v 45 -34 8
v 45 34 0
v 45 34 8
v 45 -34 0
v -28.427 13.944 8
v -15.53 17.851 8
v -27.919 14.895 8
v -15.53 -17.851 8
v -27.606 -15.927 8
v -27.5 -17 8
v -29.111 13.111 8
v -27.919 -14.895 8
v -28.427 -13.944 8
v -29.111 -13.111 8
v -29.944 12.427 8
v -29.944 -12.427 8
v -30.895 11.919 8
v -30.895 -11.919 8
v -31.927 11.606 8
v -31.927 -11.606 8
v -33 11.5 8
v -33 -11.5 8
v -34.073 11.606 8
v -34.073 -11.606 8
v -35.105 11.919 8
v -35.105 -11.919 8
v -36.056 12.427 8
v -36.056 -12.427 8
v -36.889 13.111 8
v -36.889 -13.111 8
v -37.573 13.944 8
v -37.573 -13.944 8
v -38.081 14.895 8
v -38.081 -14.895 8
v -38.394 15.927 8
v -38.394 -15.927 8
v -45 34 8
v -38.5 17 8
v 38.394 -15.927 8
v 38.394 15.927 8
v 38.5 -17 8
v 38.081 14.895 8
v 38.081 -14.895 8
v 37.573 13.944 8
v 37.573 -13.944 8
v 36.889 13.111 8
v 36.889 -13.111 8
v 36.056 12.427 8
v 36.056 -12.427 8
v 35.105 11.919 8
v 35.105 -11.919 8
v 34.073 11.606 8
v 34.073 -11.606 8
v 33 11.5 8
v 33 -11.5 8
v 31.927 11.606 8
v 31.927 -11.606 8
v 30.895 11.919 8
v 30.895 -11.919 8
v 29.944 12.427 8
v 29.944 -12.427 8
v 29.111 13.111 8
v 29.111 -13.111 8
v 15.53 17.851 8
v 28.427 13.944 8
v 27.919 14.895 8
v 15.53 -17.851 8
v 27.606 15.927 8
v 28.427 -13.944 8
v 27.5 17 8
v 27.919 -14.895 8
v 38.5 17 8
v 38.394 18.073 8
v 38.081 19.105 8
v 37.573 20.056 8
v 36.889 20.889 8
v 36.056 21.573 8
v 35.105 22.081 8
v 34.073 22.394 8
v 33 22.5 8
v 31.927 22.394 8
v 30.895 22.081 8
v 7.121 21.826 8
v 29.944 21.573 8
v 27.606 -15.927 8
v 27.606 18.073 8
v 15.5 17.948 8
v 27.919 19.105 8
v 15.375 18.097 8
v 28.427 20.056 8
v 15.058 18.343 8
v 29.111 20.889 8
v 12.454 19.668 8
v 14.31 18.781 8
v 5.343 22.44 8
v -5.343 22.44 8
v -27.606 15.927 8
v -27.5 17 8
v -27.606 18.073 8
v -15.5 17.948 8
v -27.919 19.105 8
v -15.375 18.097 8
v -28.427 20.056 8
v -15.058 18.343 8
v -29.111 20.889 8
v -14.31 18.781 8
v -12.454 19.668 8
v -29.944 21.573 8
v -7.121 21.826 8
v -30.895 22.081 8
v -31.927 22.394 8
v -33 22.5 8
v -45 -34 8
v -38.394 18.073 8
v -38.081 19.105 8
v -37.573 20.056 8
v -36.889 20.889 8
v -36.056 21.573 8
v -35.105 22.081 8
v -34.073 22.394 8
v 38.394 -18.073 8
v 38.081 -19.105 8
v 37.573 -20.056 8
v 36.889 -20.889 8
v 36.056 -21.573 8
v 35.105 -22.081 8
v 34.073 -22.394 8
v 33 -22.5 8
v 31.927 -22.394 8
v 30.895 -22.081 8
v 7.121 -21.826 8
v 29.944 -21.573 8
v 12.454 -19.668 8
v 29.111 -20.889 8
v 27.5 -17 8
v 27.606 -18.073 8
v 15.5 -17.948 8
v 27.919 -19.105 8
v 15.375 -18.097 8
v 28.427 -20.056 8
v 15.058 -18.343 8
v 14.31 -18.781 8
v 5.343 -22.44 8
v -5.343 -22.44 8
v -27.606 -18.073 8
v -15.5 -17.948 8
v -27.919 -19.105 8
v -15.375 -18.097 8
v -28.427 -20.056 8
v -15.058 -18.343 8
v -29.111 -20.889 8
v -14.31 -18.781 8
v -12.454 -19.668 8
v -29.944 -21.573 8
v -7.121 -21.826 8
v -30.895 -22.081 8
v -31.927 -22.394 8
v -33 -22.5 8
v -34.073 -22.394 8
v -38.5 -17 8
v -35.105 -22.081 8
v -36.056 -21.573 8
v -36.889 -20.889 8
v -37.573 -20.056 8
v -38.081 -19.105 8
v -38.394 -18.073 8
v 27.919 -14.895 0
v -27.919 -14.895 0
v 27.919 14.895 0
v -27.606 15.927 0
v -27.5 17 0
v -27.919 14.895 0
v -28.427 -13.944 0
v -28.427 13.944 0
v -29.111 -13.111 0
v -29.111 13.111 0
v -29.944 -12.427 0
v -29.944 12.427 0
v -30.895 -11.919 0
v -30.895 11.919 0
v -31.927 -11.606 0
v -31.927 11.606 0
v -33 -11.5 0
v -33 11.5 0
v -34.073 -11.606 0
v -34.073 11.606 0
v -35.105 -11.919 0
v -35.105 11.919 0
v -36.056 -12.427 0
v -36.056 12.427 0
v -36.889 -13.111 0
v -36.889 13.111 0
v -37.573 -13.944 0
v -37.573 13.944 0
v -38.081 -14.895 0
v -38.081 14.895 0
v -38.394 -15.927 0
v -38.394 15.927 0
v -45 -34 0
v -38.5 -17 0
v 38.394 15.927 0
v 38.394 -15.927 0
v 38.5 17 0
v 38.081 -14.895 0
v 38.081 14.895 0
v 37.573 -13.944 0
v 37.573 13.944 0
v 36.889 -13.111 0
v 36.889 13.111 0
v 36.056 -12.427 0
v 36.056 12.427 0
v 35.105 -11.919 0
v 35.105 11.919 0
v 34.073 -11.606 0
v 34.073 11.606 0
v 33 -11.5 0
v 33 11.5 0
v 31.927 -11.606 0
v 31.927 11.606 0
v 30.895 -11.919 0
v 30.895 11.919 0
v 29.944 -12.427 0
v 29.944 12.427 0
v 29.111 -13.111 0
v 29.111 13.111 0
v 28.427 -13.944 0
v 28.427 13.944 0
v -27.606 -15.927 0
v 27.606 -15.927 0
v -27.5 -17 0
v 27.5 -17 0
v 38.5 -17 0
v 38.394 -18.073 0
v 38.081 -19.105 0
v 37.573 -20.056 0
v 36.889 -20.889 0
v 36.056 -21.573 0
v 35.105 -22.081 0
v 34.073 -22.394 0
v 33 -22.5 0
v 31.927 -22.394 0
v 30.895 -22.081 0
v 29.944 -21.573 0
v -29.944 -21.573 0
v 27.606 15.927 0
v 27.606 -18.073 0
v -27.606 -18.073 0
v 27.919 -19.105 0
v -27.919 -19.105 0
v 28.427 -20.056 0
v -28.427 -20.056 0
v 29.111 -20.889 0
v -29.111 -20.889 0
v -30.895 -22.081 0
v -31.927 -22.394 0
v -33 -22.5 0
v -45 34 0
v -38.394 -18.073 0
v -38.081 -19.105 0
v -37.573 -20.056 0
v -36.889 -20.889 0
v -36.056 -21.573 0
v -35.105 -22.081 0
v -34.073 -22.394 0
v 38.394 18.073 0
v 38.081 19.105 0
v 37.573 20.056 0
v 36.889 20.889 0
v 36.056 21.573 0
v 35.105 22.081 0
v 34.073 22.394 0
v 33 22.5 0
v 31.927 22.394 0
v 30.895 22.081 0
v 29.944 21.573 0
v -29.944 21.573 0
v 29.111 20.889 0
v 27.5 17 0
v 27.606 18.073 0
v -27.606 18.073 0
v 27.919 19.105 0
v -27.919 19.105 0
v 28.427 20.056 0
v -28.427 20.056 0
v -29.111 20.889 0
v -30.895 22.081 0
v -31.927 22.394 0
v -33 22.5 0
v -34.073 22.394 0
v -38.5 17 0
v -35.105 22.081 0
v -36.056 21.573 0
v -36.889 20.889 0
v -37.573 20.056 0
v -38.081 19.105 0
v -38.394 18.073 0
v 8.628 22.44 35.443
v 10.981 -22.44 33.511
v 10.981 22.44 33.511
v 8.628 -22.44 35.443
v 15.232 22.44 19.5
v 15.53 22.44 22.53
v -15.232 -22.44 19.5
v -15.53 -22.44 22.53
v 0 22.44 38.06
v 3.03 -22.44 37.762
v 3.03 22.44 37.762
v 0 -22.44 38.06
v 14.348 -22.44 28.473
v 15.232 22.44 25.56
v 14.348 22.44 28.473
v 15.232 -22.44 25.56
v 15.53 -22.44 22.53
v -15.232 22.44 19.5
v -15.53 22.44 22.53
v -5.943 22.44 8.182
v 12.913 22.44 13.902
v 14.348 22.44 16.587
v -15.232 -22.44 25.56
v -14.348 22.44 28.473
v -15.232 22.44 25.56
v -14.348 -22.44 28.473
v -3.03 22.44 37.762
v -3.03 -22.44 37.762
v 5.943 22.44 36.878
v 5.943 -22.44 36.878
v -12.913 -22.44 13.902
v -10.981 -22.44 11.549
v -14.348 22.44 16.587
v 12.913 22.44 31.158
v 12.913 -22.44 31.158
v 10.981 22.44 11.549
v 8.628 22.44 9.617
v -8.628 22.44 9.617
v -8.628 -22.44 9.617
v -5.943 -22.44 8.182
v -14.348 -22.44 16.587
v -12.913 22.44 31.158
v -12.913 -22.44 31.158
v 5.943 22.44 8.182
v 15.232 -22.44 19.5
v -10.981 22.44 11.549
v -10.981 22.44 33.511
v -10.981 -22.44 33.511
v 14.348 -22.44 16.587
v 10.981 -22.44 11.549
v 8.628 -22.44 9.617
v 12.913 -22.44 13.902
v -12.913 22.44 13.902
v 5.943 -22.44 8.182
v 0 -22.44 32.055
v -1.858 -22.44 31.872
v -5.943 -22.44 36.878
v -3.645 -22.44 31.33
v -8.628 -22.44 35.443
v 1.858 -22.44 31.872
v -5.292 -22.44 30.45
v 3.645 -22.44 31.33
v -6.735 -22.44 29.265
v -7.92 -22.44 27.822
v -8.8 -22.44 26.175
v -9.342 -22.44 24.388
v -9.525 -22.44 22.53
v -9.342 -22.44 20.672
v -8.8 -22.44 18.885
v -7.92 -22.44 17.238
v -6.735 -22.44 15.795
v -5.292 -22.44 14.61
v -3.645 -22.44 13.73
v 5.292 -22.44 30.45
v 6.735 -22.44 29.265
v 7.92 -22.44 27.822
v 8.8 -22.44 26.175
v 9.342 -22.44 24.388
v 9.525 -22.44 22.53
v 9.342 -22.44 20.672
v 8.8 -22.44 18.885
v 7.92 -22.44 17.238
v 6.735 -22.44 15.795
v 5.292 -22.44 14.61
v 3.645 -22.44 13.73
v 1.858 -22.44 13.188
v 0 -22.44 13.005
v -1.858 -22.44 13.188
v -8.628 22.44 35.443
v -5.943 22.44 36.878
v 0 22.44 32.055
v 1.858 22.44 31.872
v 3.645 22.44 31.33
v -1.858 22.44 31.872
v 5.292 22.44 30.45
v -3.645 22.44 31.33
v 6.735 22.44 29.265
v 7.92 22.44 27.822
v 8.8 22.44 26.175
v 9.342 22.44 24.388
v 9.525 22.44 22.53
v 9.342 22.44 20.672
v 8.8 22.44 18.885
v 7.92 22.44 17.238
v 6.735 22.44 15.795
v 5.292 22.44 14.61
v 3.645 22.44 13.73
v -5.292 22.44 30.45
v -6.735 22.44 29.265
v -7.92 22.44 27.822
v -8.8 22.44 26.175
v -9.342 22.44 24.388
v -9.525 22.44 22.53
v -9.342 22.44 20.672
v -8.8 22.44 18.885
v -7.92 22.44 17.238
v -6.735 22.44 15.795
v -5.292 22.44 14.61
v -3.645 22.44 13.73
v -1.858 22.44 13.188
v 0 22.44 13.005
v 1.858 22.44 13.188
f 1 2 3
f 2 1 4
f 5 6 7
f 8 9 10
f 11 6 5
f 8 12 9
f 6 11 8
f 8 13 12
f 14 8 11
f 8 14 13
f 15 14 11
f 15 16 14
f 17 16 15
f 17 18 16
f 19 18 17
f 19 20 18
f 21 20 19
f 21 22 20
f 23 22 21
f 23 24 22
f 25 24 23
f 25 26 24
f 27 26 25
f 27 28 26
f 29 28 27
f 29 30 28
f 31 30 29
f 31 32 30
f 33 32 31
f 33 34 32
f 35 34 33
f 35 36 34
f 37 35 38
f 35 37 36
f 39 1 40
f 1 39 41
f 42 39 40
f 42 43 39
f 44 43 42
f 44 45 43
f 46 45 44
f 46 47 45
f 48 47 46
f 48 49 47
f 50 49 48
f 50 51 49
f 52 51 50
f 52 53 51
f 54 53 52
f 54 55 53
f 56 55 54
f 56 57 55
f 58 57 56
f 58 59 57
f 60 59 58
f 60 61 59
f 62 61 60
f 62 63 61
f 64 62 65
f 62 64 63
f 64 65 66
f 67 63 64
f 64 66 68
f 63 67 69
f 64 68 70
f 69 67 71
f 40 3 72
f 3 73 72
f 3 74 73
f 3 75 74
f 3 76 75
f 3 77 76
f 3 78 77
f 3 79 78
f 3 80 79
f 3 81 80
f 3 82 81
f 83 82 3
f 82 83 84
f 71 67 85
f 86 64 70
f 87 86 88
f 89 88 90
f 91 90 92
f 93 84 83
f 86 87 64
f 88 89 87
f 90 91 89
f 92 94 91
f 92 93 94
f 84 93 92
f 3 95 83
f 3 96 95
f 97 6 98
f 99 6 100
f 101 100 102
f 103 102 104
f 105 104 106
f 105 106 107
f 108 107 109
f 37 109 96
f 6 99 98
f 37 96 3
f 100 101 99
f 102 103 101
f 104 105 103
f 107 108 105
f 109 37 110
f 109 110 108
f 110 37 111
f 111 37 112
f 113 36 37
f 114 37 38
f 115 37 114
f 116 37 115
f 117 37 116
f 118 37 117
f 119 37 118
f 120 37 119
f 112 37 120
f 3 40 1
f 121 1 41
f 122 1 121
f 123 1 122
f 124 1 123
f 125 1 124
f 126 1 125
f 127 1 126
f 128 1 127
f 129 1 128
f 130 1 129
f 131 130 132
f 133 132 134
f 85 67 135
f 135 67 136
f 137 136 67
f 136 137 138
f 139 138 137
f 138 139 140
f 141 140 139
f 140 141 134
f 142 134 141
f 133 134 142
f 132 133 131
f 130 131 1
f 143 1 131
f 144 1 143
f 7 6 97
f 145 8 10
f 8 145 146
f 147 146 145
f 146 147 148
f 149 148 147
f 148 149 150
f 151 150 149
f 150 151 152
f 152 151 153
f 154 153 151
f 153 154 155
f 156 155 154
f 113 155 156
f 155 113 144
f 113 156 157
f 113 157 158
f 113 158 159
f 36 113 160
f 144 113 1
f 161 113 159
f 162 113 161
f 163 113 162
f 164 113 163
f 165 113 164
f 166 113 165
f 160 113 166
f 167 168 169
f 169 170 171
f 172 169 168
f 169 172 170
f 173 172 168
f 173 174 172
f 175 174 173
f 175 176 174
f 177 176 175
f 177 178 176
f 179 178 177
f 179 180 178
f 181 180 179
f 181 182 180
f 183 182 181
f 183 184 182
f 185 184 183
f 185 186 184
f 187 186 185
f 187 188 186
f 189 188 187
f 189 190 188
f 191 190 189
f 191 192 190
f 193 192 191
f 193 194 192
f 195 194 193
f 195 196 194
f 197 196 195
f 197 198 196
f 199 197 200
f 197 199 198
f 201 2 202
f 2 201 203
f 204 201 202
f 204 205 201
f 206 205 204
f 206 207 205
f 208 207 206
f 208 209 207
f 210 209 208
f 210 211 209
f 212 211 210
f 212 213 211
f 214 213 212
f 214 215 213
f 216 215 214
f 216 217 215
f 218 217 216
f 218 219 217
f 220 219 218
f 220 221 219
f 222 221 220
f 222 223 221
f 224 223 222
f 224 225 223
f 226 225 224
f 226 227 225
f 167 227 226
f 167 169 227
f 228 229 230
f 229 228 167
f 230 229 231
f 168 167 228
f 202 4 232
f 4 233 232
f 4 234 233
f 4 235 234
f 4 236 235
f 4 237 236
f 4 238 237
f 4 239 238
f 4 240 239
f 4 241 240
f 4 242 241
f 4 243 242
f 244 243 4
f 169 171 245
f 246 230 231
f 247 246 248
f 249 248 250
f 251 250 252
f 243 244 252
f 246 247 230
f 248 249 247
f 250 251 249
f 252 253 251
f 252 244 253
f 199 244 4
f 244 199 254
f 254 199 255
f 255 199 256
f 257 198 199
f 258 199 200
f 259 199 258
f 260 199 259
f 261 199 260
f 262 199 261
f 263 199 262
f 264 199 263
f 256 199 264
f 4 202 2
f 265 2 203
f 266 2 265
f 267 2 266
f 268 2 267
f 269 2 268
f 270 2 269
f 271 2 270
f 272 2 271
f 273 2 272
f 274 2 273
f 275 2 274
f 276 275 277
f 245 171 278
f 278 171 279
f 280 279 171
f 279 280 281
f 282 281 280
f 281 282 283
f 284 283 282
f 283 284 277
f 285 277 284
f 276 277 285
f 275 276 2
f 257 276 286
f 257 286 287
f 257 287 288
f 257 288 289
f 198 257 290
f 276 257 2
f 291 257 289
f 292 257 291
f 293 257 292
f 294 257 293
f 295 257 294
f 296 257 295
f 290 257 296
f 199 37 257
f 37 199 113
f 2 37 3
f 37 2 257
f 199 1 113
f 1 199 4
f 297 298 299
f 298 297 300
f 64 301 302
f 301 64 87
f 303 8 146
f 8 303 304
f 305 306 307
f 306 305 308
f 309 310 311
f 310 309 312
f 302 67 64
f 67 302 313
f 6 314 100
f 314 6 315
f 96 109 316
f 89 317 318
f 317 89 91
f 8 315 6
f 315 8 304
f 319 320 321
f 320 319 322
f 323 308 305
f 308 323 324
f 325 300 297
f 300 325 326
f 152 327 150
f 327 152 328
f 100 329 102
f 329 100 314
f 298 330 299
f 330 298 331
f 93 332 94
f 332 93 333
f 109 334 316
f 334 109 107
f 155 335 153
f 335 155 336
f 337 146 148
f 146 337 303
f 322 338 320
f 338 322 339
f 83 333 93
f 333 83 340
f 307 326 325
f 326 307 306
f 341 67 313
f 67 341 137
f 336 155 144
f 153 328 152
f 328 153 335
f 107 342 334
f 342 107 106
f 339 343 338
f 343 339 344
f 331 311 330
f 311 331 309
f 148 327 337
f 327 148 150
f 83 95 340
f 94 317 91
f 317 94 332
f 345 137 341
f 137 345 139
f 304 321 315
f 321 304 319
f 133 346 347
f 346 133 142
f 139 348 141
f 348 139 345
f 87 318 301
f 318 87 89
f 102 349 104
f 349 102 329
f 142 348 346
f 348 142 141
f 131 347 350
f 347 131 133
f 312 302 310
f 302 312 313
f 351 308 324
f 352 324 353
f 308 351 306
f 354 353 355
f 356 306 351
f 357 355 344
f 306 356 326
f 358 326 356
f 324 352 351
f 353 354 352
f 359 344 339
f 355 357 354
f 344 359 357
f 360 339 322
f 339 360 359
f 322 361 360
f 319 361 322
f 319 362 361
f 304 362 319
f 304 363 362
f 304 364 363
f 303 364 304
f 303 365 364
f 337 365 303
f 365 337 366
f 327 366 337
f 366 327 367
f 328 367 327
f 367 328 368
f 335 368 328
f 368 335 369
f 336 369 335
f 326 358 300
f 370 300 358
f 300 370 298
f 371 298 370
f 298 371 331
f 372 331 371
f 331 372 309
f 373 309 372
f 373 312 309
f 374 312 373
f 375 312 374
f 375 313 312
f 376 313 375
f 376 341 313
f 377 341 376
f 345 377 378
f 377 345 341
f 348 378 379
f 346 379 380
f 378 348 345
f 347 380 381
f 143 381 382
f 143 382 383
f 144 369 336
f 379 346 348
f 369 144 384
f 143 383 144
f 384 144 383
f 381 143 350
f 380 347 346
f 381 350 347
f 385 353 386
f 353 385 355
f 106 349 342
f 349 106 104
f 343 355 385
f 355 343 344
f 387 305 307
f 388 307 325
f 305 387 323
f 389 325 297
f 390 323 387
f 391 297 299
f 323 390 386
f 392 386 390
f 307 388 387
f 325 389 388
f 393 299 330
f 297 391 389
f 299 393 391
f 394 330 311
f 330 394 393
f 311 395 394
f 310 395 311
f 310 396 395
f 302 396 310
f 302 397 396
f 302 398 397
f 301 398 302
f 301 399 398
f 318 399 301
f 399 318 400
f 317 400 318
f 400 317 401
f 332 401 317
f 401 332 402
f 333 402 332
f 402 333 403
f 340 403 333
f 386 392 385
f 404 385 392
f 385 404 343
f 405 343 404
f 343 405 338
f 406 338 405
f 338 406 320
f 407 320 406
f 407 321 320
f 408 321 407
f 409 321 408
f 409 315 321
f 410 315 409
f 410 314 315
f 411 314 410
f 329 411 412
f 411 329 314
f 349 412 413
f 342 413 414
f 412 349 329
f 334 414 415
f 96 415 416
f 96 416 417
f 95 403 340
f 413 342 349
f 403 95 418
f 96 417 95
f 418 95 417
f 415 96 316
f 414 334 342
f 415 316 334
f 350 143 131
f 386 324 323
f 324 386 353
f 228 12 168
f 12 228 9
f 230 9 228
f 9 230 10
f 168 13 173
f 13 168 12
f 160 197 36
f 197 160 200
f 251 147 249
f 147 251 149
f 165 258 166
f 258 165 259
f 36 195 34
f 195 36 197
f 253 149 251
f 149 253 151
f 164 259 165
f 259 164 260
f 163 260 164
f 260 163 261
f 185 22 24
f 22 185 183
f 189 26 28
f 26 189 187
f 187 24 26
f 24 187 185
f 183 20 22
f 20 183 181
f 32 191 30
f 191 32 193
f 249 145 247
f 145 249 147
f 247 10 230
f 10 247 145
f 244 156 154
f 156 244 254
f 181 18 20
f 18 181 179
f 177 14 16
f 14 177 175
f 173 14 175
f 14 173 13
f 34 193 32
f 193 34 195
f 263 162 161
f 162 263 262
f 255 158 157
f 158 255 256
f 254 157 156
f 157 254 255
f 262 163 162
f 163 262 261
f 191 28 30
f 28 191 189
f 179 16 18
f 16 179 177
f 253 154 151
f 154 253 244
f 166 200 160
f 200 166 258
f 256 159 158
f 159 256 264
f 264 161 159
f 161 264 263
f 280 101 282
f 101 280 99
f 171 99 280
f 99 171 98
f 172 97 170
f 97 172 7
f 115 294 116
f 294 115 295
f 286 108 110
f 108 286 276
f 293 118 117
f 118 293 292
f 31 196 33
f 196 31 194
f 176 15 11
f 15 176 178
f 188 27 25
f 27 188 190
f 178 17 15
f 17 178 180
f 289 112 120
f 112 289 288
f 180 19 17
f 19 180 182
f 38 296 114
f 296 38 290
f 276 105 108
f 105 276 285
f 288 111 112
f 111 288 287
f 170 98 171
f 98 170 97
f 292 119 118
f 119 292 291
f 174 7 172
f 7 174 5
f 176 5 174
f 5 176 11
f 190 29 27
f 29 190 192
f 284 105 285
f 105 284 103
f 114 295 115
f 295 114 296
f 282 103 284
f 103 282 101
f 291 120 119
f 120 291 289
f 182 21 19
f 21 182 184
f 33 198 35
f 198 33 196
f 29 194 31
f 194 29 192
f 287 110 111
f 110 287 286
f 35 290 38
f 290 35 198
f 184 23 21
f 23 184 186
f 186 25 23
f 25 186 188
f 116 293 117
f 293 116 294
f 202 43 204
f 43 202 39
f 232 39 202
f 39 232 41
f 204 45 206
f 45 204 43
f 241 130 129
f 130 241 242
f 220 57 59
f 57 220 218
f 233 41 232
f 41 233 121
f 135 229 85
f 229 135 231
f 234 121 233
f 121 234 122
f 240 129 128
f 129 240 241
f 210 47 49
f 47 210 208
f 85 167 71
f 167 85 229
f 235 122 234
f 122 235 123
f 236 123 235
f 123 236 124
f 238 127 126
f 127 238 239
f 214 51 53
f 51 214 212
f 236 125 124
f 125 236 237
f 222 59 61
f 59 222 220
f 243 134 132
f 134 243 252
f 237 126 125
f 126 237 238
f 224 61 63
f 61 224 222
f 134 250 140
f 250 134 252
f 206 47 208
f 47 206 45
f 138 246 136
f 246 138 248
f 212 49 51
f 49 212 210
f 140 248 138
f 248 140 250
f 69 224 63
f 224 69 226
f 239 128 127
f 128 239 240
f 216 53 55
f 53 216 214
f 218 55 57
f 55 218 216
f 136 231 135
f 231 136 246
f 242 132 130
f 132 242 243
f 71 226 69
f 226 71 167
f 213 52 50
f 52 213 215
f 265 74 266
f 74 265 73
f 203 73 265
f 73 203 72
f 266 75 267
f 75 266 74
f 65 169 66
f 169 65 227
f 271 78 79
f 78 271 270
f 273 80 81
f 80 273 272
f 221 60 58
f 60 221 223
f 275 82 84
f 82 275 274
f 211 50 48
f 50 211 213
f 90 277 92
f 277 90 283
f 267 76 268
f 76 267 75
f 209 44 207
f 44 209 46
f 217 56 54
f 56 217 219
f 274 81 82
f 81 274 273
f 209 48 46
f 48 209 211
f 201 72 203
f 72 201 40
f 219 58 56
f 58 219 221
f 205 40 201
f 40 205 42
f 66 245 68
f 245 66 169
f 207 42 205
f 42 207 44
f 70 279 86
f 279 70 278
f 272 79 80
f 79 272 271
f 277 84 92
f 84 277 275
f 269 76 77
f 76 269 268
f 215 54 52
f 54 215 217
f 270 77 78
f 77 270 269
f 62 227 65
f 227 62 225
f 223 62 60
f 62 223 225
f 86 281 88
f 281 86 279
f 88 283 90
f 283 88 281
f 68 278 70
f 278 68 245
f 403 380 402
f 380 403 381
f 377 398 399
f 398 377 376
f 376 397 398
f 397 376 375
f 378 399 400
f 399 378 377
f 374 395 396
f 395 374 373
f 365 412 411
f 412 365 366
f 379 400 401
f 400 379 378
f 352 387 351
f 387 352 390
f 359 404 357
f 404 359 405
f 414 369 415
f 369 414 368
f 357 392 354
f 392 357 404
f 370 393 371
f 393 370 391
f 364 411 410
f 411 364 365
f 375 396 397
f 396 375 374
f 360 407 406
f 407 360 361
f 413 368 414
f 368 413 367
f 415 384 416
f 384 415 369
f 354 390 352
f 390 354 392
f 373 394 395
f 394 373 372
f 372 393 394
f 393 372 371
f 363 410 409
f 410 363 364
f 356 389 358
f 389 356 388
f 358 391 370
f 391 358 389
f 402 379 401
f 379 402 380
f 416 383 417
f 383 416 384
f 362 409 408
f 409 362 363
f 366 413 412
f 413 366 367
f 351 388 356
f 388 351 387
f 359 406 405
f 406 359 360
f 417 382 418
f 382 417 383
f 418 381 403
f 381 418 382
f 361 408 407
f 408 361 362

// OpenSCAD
$fn = 32;

// ----------------------------------------------------------------------
// Bearing block: 90 x 68 mm base, 19.05 mm bore at 22.53 mm
// ----------------------------------------------------------------------

// --- parameters (mm) ---
base_w = 90;              // base width
base_d = 68;              // base depth
base_t = 8;               // base thickness
bore_d = 19.05;           // shaft / bearing bore
house_r = 15.53;          // housing outer radius
house_len = 44.88;        // housing length along the shaft
foot_w = 31.06;           // foot width under the housing
foot_len = 34.88;         // foot length along the shaft
axis_z = 22.53;           // bore axis height above the base
holes_d = 11;             // mounting holes
hole_x = 33;              // mounting hole spacing

difference() {
  union() {
    /* base plate with its underside on z = 0 */
    translate([0, 0, base_t / 2]) cube([base_w, base_d, base_t], center = true);
    /* hull foot: a straight web blending into the round housing */
    hull() {
      translate([0, 0, base_t - 0.5]) cube([foot_w, foot_len, 1.6], center = true);
      translate([0, 0, axis_z]) rotate([-90, 0, 0]) cylinder(h = house_len, d = 2 * house_r, center = true);
    }
  }
  /* bore through the housing, 2.5 mm clear on both sides */
  translate([0, 0, axis_z]) rotate([-90, 0, 0]) cylinder(h = house_len + 5, d = bore_d, center = true);
  /* mounting holes through the base plate */
  for (hx = [-33, 33]) {
    for (hy = [-17, 17]) {
      translate([hx, hy, -2.5]) cylinder(h = base_t + 5, d = holes_d);
    }
  }
}
